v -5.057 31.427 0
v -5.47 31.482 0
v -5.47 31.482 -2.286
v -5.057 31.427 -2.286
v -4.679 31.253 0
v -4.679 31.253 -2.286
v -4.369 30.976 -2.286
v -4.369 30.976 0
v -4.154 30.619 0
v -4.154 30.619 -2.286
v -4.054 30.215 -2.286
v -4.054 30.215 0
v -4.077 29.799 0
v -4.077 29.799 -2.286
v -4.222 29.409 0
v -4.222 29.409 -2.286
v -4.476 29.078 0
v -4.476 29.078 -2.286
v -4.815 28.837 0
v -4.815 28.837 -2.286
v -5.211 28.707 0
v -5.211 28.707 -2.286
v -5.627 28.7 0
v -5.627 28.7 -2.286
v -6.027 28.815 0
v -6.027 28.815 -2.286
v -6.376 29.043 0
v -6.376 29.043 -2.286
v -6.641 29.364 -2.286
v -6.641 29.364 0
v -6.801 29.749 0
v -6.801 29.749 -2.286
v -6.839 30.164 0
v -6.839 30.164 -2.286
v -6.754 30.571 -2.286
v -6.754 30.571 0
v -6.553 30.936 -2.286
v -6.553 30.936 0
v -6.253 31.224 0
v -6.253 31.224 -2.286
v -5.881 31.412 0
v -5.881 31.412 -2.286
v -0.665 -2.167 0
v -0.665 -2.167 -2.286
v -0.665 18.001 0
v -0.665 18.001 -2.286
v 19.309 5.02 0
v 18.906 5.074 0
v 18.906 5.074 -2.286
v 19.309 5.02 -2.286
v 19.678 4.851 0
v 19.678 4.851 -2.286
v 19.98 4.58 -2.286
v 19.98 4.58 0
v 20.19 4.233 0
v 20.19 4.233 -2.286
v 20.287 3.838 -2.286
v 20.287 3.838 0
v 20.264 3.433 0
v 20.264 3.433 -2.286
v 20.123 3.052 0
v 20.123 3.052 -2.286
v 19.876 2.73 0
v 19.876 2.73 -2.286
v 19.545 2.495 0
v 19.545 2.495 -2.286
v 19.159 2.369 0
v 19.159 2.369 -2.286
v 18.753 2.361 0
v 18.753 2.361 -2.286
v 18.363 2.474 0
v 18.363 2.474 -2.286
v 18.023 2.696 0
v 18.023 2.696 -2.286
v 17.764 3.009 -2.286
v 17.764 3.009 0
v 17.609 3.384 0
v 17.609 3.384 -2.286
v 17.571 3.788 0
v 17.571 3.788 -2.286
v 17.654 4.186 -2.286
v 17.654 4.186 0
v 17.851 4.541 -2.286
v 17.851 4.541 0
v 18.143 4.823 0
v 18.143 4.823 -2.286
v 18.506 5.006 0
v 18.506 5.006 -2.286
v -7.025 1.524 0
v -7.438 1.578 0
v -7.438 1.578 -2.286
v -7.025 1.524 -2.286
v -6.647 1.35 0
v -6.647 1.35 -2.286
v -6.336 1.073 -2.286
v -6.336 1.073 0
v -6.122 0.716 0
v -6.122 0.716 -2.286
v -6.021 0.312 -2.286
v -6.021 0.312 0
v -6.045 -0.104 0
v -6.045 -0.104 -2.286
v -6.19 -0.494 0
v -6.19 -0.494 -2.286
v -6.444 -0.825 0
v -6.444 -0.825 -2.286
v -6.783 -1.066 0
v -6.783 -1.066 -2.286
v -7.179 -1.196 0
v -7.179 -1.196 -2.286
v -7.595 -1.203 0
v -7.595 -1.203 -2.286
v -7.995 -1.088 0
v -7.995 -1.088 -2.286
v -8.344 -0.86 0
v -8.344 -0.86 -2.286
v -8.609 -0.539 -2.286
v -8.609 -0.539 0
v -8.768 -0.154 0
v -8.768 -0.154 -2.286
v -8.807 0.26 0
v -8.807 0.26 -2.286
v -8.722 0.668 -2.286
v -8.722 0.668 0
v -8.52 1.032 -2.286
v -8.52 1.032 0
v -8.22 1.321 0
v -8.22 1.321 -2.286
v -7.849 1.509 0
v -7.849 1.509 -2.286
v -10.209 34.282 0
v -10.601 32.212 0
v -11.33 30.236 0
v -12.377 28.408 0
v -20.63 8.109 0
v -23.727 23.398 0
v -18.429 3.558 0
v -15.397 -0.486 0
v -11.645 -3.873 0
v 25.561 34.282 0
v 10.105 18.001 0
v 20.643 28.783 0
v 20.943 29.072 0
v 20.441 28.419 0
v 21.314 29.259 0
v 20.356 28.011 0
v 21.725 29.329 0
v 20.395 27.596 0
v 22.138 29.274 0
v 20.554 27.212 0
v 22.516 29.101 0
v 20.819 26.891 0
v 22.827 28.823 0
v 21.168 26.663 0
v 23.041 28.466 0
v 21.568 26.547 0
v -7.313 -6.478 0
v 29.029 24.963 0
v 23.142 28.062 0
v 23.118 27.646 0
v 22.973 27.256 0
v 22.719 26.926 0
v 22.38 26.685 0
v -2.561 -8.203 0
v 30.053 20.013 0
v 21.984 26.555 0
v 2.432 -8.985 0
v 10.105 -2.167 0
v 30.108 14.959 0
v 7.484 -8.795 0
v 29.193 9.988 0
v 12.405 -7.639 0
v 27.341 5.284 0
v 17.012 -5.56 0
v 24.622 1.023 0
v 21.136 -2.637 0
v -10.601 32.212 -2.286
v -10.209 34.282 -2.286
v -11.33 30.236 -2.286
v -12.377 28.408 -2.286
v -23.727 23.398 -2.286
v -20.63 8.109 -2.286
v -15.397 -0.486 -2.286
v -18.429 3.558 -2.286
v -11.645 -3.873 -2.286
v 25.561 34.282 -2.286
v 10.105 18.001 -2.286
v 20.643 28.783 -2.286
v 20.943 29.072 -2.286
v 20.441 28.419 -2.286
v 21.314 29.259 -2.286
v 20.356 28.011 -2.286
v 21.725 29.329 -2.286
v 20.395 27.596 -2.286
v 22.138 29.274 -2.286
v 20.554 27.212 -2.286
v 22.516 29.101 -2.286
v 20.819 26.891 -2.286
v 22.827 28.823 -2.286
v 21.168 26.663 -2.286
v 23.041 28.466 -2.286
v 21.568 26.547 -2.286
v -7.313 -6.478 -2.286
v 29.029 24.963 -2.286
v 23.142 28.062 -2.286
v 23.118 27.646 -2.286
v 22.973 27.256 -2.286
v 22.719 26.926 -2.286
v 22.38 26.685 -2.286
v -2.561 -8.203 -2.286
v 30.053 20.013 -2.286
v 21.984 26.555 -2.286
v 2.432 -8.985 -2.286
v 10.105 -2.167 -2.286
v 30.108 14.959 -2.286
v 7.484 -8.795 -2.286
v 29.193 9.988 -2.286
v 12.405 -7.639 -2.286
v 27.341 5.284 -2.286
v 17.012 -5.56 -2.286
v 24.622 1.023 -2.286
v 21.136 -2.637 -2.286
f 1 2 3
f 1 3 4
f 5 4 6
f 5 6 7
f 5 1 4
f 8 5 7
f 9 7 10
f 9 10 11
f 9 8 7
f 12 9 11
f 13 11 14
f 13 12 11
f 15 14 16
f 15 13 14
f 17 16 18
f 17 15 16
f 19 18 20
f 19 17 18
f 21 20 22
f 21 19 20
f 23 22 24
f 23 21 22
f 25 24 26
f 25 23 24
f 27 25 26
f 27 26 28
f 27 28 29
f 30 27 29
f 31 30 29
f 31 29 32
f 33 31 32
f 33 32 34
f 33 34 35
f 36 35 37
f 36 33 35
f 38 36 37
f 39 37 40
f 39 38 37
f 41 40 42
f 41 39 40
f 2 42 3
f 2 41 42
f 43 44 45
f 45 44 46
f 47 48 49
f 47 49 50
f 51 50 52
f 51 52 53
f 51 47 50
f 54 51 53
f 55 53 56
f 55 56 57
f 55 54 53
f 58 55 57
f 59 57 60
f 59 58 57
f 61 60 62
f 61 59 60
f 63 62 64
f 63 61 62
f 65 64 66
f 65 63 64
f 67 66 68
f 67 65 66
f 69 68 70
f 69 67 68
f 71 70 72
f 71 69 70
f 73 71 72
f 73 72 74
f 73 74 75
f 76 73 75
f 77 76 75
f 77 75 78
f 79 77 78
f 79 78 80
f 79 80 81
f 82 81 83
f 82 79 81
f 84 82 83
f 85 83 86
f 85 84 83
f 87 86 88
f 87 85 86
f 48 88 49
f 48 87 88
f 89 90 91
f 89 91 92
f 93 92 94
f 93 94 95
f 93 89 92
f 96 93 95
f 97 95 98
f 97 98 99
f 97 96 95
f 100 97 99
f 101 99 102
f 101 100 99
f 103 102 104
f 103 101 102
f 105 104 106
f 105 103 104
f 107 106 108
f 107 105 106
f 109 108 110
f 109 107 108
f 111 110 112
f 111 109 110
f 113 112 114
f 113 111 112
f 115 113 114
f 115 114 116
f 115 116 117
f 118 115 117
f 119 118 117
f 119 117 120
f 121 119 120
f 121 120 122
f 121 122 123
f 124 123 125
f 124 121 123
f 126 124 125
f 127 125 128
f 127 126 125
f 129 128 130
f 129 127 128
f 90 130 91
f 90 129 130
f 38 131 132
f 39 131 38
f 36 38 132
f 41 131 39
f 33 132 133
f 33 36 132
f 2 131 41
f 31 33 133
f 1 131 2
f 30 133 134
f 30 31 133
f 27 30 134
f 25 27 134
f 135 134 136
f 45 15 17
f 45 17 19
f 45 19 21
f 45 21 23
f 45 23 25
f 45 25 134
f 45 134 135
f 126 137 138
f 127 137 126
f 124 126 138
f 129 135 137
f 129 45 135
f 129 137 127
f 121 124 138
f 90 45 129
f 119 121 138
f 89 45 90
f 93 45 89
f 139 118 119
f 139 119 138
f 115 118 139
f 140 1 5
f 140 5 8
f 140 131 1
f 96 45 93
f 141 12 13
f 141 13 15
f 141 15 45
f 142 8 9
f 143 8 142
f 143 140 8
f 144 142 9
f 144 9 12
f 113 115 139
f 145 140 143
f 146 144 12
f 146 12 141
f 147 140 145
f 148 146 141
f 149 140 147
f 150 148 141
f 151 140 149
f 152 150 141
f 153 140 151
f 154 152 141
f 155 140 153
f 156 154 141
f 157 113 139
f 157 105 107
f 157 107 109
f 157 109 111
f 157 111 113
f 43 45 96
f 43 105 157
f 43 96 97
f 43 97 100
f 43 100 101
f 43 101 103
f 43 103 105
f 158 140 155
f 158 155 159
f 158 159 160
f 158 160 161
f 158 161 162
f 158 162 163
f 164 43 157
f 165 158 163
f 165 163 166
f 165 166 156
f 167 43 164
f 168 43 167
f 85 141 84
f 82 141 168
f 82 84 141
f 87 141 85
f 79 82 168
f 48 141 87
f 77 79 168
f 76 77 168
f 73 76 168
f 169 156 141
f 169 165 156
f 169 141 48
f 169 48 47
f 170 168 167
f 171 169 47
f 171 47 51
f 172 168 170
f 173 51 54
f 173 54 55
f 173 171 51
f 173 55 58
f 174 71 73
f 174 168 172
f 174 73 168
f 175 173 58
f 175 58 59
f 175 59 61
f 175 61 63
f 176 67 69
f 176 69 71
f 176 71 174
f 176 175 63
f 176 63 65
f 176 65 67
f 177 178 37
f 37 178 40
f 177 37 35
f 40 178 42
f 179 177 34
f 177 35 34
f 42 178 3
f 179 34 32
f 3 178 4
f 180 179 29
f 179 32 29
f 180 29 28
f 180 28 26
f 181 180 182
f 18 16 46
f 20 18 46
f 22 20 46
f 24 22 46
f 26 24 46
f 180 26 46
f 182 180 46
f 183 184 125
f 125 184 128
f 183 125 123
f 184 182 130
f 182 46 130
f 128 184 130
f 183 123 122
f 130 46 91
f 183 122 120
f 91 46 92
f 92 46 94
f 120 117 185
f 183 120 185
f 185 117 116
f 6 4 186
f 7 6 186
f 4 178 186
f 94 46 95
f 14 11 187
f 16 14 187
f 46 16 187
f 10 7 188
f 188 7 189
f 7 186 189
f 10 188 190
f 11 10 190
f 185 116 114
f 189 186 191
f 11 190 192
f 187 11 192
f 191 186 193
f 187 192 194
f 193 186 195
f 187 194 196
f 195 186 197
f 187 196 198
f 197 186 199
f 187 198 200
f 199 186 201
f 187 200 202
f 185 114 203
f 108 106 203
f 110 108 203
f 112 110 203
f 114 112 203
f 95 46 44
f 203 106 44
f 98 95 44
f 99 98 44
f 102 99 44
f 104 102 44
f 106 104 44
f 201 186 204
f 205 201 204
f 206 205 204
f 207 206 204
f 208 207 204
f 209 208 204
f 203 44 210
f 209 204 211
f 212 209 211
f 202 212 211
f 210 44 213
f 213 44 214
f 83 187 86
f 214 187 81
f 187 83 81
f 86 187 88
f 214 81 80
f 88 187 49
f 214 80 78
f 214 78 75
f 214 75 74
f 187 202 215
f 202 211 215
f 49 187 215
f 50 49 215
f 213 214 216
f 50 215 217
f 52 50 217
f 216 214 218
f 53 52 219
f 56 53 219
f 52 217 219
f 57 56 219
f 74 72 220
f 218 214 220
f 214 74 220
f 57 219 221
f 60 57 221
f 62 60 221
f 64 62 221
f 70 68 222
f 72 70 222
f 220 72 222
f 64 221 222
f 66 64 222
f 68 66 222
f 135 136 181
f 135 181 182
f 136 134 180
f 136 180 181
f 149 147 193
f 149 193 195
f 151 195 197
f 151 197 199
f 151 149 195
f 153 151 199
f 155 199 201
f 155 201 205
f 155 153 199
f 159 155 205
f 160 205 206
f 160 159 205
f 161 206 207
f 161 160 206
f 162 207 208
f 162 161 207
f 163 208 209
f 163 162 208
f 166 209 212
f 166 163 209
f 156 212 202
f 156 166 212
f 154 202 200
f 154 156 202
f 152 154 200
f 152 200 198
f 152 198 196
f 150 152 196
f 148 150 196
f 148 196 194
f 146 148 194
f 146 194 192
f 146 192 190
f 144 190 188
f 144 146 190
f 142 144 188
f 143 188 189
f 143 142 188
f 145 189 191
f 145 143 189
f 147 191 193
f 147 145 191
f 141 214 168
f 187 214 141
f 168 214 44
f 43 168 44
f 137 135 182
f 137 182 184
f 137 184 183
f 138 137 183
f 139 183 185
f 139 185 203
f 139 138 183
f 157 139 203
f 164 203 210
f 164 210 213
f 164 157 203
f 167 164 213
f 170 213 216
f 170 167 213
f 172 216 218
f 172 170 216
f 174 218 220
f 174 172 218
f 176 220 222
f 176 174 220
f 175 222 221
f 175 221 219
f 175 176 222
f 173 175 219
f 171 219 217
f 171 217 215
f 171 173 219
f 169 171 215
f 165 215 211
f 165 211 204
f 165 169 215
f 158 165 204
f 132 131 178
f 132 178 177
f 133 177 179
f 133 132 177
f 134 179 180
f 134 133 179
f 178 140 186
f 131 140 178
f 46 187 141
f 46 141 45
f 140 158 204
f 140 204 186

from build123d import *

# Parameters (mm, degrees)
SKETCH5_R      = 1.397
SKETCH5_R_2    = 1.362219034
EXTRUDE1_DEPTH = 2.286
SKETCH10_W     = 10.7696
SKETCH10_H     = 20.1676
EXTRUDE2_DEPTH = 2.286


with BuildPart() as part:
    # Sketch5 → Extrude1 (new body)
    with BuildSketch(Plane(origin=(0, 0, 0), x_dir=(-0.018375543, 0.999831155, 0), z_dir=(0, 0, -1))):
        with BuildLine():
            Line((33.80665155, 26.18621859), (34.46394605, -9.577814671))
            ThreePointArc((34.46394605, -9.577814671), (31.404055355, -10.348947358), (28.630167887, -11.853315998))
            Line((28.630167887, -11.853315998), (23.830153765, -23.292701447))
            Line((23.830153765, -23.292701447), (8.486225874, -20.477486777))
            ThreePointArc((8.486225874, -20.477486777), (-7.865336256, 12.262044577), (24.425706506, 29.482353943))
            Line((24.425706506, 29.482353943), (33.80665155, 26.18621859))
        make_face()
        with Locations((27.527734531, 22.260177192)):
            Circle(SKETCH5_R, mode=Mode.SUBTRACT)
        with Locations((30.179746314, -4.890797216)):
            Circle(SKETCH5_R, mode=Mode.SUBTRACT)
        with Locations((3.363138785, 18.996048152)):
            Circle(SKETCH5_R_2, mode=Mode.SUBTRACT)
        with Locations((0.317842079, -7.407837933)):
            Circle(SKETCH5_R, mode=Mode.SUBTRACT)
    extrude(amount=EXTRUDE1_DEPTH)

    # Sketch10 → Extrude2 (cut)
    with BuildSketch(Plane(origin=(0, 0, -2.286), x_dir=(-1, 0, 0), z_dir=(0, 0, -1))):
        with Locations((-4.719875056, 7.916929458)):
            Rectangle(SKETCH10_W, SKETCH10_H)
    extrude(amount=-EXTRUDE2_DEPTH, mode=Mode.SUBTRACT)


solid = part.part
